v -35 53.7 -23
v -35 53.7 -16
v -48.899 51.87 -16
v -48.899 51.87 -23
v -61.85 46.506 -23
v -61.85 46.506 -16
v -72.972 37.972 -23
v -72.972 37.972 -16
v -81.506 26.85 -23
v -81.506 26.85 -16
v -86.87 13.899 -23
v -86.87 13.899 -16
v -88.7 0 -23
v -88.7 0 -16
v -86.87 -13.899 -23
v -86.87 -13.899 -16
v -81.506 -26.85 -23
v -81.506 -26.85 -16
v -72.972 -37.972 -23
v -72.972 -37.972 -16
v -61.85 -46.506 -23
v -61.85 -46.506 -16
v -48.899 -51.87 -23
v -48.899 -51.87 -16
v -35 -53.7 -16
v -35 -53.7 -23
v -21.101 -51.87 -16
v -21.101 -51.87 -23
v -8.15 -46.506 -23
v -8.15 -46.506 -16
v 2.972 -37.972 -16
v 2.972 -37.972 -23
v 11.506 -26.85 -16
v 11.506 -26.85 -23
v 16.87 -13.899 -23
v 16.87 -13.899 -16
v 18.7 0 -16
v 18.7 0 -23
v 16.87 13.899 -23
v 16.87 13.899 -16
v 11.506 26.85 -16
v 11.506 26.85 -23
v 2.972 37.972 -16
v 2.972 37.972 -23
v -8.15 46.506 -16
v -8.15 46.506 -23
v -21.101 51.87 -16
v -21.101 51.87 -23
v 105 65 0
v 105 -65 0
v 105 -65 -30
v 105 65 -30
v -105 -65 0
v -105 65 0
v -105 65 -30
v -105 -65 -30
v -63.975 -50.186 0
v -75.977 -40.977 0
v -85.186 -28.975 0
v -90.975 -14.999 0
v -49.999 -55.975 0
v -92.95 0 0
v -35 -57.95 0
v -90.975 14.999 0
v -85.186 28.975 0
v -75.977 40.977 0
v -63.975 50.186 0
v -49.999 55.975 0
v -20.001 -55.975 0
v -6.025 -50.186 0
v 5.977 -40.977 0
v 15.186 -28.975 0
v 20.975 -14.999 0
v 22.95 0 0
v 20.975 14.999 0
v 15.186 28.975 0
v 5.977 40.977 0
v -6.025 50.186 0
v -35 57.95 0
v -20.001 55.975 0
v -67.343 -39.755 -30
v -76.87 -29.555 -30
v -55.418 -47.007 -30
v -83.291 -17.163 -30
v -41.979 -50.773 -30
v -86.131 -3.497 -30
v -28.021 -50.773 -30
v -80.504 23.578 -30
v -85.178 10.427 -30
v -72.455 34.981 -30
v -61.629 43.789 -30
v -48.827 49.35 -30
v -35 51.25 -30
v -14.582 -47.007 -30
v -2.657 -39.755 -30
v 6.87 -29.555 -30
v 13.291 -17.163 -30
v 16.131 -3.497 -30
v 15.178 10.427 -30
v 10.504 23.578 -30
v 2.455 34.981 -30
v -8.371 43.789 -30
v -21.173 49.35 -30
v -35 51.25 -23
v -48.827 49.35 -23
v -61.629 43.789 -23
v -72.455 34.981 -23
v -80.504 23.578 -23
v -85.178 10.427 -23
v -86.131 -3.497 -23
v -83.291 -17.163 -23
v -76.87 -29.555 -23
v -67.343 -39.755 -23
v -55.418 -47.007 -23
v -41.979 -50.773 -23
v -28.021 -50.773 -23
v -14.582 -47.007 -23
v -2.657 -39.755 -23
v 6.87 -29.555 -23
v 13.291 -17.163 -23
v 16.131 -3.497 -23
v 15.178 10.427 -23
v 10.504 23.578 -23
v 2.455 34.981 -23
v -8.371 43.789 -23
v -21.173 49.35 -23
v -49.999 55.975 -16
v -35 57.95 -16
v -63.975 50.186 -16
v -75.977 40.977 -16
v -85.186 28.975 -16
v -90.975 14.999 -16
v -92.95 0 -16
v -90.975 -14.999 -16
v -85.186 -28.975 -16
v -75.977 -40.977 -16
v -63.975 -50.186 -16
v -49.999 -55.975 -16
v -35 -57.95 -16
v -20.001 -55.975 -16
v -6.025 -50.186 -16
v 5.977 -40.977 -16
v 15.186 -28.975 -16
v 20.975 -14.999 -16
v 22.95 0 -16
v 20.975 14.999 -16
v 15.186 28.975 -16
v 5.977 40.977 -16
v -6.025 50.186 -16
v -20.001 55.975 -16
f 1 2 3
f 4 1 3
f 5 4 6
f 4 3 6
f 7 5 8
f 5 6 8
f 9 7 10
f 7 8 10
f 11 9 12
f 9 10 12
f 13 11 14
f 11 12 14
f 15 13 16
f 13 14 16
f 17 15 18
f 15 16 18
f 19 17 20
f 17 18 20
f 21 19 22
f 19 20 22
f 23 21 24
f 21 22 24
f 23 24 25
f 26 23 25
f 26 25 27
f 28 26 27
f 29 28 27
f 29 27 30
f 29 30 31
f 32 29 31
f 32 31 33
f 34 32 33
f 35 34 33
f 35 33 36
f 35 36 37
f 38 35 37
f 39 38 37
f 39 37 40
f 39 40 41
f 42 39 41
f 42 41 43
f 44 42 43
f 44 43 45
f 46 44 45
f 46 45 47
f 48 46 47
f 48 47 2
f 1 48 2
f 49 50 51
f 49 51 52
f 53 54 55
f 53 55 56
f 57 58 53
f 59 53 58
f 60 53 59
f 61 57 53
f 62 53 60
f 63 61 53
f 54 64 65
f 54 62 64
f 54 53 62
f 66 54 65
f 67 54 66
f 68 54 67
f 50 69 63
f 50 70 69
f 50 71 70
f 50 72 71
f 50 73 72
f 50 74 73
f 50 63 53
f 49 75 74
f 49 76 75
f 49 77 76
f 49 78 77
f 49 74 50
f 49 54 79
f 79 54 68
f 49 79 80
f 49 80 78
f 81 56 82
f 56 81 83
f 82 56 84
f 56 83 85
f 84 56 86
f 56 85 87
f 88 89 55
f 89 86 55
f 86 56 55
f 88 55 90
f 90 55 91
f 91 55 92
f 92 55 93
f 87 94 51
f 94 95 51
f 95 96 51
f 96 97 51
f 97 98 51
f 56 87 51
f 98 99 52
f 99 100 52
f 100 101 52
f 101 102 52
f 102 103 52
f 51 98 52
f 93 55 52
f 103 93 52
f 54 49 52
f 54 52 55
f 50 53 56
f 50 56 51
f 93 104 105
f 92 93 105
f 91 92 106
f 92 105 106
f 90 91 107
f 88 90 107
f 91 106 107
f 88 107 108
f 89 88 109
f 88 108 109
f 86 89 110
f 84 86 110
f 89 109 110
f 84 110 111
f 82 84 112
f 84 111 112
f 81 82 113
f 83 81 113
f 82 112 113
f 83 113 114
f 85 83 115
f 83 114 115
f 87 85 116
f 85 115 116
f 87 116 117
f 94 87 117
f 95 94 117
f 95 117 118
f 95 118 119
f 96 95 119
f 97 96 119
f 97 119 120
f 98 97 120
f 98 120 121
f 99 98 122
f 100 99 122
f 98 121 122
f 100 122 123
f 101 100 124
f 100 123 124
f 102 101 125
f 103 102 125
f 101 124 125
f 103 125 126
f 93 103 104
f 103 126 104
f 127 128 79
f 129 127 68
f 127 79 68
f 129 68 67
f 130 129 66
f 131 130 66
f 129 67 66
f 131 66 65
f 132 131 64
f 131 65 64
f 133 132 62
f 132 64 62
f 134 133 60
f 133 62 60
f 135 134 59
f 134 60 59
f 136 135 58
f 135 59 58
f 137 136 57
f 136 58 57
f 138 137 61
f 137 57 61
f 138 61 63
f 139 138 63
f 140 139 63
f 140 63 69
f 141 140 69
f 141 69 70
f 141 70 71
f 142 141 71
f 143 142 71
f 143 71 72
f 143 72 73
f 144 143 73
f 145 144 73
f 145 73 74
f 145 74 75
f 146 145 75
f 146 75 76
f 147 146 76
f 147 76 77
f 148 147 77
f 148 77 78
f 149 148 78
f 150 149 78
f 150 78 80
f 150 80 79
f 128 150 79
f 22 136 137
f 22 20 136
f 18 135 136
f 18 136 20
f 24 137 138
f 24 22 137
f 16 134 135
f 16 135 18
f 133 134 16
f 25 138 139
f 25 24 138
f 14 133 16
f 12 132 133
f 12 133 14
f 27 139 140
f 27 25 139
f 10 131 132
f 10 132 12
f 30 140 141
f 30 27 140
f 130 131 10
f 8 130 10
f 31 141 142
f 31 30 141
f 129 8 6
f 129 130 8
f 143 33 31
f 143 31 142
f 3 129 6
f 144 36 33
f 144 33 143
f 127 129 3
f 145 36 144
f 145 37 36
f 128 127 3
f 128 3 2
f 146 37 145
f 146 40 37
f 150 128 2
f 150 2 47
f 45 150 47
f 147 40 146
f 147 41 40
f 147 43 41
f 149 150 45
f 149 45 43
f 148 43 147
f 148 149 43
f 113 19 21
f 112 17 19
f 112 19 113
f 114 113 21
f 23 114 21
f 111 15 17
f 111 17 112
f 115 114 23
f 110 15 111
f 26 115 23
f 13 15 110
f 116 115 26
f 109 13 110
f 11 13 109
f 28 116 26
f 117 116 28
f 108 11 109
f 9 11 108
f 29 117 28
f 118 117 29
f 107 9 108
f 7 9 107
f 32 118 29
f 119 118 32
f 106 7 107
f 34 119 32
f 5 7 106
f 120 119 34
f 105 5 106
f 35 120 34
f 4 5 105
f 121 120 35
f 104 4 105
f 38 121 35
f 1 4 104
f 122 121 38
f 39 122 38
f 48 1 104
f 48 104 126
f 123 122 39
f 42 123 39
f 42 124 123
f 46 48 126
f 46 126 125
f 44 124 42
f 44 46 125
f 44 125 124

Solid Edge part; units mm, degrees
sketch "Sketch1" plane through (0, 0, 0) normal (0, 0, 1) x (1, 0, 0)
  line L0 (-105, -65) -> (105, -65)
  line L1 (105, -65) -> (105, 65)
  line L2 (105, 65) -> (-105, 65)
  line L3 (-105, 65) -> (-105, -65)
extrude "Protrusion1" add sketch "Sketch1" against normal blind 30
sketch "Sketch2" plane through (0, 0, 0) normal (0, 0, 1) x (0, 1, 0)
  circle A0 centre (0, 35) radius 51.25
extrude "Recorte_Extrudado_4" cut sketch "Sketch2" against normal blind 30
sketch "Sketch3" plane through (0, 0, 0) normal (0, 0, 1) x (0, 1, 0)
  circle A0 centre (0, 35) radius 53.7
extrude "Recorte_Extrudado_5" cut sketch "Sketch3" against normal blind 23
sketch "Sketch4" plane through (0, 0, 0) normal (0, 0, 1) x (0, 1, 0)
  circle A0 centre (0, 35) radius 57.95
extrude "Recorte_Extrudado_6" cut sketch "Sketch4" against normal blind 16
